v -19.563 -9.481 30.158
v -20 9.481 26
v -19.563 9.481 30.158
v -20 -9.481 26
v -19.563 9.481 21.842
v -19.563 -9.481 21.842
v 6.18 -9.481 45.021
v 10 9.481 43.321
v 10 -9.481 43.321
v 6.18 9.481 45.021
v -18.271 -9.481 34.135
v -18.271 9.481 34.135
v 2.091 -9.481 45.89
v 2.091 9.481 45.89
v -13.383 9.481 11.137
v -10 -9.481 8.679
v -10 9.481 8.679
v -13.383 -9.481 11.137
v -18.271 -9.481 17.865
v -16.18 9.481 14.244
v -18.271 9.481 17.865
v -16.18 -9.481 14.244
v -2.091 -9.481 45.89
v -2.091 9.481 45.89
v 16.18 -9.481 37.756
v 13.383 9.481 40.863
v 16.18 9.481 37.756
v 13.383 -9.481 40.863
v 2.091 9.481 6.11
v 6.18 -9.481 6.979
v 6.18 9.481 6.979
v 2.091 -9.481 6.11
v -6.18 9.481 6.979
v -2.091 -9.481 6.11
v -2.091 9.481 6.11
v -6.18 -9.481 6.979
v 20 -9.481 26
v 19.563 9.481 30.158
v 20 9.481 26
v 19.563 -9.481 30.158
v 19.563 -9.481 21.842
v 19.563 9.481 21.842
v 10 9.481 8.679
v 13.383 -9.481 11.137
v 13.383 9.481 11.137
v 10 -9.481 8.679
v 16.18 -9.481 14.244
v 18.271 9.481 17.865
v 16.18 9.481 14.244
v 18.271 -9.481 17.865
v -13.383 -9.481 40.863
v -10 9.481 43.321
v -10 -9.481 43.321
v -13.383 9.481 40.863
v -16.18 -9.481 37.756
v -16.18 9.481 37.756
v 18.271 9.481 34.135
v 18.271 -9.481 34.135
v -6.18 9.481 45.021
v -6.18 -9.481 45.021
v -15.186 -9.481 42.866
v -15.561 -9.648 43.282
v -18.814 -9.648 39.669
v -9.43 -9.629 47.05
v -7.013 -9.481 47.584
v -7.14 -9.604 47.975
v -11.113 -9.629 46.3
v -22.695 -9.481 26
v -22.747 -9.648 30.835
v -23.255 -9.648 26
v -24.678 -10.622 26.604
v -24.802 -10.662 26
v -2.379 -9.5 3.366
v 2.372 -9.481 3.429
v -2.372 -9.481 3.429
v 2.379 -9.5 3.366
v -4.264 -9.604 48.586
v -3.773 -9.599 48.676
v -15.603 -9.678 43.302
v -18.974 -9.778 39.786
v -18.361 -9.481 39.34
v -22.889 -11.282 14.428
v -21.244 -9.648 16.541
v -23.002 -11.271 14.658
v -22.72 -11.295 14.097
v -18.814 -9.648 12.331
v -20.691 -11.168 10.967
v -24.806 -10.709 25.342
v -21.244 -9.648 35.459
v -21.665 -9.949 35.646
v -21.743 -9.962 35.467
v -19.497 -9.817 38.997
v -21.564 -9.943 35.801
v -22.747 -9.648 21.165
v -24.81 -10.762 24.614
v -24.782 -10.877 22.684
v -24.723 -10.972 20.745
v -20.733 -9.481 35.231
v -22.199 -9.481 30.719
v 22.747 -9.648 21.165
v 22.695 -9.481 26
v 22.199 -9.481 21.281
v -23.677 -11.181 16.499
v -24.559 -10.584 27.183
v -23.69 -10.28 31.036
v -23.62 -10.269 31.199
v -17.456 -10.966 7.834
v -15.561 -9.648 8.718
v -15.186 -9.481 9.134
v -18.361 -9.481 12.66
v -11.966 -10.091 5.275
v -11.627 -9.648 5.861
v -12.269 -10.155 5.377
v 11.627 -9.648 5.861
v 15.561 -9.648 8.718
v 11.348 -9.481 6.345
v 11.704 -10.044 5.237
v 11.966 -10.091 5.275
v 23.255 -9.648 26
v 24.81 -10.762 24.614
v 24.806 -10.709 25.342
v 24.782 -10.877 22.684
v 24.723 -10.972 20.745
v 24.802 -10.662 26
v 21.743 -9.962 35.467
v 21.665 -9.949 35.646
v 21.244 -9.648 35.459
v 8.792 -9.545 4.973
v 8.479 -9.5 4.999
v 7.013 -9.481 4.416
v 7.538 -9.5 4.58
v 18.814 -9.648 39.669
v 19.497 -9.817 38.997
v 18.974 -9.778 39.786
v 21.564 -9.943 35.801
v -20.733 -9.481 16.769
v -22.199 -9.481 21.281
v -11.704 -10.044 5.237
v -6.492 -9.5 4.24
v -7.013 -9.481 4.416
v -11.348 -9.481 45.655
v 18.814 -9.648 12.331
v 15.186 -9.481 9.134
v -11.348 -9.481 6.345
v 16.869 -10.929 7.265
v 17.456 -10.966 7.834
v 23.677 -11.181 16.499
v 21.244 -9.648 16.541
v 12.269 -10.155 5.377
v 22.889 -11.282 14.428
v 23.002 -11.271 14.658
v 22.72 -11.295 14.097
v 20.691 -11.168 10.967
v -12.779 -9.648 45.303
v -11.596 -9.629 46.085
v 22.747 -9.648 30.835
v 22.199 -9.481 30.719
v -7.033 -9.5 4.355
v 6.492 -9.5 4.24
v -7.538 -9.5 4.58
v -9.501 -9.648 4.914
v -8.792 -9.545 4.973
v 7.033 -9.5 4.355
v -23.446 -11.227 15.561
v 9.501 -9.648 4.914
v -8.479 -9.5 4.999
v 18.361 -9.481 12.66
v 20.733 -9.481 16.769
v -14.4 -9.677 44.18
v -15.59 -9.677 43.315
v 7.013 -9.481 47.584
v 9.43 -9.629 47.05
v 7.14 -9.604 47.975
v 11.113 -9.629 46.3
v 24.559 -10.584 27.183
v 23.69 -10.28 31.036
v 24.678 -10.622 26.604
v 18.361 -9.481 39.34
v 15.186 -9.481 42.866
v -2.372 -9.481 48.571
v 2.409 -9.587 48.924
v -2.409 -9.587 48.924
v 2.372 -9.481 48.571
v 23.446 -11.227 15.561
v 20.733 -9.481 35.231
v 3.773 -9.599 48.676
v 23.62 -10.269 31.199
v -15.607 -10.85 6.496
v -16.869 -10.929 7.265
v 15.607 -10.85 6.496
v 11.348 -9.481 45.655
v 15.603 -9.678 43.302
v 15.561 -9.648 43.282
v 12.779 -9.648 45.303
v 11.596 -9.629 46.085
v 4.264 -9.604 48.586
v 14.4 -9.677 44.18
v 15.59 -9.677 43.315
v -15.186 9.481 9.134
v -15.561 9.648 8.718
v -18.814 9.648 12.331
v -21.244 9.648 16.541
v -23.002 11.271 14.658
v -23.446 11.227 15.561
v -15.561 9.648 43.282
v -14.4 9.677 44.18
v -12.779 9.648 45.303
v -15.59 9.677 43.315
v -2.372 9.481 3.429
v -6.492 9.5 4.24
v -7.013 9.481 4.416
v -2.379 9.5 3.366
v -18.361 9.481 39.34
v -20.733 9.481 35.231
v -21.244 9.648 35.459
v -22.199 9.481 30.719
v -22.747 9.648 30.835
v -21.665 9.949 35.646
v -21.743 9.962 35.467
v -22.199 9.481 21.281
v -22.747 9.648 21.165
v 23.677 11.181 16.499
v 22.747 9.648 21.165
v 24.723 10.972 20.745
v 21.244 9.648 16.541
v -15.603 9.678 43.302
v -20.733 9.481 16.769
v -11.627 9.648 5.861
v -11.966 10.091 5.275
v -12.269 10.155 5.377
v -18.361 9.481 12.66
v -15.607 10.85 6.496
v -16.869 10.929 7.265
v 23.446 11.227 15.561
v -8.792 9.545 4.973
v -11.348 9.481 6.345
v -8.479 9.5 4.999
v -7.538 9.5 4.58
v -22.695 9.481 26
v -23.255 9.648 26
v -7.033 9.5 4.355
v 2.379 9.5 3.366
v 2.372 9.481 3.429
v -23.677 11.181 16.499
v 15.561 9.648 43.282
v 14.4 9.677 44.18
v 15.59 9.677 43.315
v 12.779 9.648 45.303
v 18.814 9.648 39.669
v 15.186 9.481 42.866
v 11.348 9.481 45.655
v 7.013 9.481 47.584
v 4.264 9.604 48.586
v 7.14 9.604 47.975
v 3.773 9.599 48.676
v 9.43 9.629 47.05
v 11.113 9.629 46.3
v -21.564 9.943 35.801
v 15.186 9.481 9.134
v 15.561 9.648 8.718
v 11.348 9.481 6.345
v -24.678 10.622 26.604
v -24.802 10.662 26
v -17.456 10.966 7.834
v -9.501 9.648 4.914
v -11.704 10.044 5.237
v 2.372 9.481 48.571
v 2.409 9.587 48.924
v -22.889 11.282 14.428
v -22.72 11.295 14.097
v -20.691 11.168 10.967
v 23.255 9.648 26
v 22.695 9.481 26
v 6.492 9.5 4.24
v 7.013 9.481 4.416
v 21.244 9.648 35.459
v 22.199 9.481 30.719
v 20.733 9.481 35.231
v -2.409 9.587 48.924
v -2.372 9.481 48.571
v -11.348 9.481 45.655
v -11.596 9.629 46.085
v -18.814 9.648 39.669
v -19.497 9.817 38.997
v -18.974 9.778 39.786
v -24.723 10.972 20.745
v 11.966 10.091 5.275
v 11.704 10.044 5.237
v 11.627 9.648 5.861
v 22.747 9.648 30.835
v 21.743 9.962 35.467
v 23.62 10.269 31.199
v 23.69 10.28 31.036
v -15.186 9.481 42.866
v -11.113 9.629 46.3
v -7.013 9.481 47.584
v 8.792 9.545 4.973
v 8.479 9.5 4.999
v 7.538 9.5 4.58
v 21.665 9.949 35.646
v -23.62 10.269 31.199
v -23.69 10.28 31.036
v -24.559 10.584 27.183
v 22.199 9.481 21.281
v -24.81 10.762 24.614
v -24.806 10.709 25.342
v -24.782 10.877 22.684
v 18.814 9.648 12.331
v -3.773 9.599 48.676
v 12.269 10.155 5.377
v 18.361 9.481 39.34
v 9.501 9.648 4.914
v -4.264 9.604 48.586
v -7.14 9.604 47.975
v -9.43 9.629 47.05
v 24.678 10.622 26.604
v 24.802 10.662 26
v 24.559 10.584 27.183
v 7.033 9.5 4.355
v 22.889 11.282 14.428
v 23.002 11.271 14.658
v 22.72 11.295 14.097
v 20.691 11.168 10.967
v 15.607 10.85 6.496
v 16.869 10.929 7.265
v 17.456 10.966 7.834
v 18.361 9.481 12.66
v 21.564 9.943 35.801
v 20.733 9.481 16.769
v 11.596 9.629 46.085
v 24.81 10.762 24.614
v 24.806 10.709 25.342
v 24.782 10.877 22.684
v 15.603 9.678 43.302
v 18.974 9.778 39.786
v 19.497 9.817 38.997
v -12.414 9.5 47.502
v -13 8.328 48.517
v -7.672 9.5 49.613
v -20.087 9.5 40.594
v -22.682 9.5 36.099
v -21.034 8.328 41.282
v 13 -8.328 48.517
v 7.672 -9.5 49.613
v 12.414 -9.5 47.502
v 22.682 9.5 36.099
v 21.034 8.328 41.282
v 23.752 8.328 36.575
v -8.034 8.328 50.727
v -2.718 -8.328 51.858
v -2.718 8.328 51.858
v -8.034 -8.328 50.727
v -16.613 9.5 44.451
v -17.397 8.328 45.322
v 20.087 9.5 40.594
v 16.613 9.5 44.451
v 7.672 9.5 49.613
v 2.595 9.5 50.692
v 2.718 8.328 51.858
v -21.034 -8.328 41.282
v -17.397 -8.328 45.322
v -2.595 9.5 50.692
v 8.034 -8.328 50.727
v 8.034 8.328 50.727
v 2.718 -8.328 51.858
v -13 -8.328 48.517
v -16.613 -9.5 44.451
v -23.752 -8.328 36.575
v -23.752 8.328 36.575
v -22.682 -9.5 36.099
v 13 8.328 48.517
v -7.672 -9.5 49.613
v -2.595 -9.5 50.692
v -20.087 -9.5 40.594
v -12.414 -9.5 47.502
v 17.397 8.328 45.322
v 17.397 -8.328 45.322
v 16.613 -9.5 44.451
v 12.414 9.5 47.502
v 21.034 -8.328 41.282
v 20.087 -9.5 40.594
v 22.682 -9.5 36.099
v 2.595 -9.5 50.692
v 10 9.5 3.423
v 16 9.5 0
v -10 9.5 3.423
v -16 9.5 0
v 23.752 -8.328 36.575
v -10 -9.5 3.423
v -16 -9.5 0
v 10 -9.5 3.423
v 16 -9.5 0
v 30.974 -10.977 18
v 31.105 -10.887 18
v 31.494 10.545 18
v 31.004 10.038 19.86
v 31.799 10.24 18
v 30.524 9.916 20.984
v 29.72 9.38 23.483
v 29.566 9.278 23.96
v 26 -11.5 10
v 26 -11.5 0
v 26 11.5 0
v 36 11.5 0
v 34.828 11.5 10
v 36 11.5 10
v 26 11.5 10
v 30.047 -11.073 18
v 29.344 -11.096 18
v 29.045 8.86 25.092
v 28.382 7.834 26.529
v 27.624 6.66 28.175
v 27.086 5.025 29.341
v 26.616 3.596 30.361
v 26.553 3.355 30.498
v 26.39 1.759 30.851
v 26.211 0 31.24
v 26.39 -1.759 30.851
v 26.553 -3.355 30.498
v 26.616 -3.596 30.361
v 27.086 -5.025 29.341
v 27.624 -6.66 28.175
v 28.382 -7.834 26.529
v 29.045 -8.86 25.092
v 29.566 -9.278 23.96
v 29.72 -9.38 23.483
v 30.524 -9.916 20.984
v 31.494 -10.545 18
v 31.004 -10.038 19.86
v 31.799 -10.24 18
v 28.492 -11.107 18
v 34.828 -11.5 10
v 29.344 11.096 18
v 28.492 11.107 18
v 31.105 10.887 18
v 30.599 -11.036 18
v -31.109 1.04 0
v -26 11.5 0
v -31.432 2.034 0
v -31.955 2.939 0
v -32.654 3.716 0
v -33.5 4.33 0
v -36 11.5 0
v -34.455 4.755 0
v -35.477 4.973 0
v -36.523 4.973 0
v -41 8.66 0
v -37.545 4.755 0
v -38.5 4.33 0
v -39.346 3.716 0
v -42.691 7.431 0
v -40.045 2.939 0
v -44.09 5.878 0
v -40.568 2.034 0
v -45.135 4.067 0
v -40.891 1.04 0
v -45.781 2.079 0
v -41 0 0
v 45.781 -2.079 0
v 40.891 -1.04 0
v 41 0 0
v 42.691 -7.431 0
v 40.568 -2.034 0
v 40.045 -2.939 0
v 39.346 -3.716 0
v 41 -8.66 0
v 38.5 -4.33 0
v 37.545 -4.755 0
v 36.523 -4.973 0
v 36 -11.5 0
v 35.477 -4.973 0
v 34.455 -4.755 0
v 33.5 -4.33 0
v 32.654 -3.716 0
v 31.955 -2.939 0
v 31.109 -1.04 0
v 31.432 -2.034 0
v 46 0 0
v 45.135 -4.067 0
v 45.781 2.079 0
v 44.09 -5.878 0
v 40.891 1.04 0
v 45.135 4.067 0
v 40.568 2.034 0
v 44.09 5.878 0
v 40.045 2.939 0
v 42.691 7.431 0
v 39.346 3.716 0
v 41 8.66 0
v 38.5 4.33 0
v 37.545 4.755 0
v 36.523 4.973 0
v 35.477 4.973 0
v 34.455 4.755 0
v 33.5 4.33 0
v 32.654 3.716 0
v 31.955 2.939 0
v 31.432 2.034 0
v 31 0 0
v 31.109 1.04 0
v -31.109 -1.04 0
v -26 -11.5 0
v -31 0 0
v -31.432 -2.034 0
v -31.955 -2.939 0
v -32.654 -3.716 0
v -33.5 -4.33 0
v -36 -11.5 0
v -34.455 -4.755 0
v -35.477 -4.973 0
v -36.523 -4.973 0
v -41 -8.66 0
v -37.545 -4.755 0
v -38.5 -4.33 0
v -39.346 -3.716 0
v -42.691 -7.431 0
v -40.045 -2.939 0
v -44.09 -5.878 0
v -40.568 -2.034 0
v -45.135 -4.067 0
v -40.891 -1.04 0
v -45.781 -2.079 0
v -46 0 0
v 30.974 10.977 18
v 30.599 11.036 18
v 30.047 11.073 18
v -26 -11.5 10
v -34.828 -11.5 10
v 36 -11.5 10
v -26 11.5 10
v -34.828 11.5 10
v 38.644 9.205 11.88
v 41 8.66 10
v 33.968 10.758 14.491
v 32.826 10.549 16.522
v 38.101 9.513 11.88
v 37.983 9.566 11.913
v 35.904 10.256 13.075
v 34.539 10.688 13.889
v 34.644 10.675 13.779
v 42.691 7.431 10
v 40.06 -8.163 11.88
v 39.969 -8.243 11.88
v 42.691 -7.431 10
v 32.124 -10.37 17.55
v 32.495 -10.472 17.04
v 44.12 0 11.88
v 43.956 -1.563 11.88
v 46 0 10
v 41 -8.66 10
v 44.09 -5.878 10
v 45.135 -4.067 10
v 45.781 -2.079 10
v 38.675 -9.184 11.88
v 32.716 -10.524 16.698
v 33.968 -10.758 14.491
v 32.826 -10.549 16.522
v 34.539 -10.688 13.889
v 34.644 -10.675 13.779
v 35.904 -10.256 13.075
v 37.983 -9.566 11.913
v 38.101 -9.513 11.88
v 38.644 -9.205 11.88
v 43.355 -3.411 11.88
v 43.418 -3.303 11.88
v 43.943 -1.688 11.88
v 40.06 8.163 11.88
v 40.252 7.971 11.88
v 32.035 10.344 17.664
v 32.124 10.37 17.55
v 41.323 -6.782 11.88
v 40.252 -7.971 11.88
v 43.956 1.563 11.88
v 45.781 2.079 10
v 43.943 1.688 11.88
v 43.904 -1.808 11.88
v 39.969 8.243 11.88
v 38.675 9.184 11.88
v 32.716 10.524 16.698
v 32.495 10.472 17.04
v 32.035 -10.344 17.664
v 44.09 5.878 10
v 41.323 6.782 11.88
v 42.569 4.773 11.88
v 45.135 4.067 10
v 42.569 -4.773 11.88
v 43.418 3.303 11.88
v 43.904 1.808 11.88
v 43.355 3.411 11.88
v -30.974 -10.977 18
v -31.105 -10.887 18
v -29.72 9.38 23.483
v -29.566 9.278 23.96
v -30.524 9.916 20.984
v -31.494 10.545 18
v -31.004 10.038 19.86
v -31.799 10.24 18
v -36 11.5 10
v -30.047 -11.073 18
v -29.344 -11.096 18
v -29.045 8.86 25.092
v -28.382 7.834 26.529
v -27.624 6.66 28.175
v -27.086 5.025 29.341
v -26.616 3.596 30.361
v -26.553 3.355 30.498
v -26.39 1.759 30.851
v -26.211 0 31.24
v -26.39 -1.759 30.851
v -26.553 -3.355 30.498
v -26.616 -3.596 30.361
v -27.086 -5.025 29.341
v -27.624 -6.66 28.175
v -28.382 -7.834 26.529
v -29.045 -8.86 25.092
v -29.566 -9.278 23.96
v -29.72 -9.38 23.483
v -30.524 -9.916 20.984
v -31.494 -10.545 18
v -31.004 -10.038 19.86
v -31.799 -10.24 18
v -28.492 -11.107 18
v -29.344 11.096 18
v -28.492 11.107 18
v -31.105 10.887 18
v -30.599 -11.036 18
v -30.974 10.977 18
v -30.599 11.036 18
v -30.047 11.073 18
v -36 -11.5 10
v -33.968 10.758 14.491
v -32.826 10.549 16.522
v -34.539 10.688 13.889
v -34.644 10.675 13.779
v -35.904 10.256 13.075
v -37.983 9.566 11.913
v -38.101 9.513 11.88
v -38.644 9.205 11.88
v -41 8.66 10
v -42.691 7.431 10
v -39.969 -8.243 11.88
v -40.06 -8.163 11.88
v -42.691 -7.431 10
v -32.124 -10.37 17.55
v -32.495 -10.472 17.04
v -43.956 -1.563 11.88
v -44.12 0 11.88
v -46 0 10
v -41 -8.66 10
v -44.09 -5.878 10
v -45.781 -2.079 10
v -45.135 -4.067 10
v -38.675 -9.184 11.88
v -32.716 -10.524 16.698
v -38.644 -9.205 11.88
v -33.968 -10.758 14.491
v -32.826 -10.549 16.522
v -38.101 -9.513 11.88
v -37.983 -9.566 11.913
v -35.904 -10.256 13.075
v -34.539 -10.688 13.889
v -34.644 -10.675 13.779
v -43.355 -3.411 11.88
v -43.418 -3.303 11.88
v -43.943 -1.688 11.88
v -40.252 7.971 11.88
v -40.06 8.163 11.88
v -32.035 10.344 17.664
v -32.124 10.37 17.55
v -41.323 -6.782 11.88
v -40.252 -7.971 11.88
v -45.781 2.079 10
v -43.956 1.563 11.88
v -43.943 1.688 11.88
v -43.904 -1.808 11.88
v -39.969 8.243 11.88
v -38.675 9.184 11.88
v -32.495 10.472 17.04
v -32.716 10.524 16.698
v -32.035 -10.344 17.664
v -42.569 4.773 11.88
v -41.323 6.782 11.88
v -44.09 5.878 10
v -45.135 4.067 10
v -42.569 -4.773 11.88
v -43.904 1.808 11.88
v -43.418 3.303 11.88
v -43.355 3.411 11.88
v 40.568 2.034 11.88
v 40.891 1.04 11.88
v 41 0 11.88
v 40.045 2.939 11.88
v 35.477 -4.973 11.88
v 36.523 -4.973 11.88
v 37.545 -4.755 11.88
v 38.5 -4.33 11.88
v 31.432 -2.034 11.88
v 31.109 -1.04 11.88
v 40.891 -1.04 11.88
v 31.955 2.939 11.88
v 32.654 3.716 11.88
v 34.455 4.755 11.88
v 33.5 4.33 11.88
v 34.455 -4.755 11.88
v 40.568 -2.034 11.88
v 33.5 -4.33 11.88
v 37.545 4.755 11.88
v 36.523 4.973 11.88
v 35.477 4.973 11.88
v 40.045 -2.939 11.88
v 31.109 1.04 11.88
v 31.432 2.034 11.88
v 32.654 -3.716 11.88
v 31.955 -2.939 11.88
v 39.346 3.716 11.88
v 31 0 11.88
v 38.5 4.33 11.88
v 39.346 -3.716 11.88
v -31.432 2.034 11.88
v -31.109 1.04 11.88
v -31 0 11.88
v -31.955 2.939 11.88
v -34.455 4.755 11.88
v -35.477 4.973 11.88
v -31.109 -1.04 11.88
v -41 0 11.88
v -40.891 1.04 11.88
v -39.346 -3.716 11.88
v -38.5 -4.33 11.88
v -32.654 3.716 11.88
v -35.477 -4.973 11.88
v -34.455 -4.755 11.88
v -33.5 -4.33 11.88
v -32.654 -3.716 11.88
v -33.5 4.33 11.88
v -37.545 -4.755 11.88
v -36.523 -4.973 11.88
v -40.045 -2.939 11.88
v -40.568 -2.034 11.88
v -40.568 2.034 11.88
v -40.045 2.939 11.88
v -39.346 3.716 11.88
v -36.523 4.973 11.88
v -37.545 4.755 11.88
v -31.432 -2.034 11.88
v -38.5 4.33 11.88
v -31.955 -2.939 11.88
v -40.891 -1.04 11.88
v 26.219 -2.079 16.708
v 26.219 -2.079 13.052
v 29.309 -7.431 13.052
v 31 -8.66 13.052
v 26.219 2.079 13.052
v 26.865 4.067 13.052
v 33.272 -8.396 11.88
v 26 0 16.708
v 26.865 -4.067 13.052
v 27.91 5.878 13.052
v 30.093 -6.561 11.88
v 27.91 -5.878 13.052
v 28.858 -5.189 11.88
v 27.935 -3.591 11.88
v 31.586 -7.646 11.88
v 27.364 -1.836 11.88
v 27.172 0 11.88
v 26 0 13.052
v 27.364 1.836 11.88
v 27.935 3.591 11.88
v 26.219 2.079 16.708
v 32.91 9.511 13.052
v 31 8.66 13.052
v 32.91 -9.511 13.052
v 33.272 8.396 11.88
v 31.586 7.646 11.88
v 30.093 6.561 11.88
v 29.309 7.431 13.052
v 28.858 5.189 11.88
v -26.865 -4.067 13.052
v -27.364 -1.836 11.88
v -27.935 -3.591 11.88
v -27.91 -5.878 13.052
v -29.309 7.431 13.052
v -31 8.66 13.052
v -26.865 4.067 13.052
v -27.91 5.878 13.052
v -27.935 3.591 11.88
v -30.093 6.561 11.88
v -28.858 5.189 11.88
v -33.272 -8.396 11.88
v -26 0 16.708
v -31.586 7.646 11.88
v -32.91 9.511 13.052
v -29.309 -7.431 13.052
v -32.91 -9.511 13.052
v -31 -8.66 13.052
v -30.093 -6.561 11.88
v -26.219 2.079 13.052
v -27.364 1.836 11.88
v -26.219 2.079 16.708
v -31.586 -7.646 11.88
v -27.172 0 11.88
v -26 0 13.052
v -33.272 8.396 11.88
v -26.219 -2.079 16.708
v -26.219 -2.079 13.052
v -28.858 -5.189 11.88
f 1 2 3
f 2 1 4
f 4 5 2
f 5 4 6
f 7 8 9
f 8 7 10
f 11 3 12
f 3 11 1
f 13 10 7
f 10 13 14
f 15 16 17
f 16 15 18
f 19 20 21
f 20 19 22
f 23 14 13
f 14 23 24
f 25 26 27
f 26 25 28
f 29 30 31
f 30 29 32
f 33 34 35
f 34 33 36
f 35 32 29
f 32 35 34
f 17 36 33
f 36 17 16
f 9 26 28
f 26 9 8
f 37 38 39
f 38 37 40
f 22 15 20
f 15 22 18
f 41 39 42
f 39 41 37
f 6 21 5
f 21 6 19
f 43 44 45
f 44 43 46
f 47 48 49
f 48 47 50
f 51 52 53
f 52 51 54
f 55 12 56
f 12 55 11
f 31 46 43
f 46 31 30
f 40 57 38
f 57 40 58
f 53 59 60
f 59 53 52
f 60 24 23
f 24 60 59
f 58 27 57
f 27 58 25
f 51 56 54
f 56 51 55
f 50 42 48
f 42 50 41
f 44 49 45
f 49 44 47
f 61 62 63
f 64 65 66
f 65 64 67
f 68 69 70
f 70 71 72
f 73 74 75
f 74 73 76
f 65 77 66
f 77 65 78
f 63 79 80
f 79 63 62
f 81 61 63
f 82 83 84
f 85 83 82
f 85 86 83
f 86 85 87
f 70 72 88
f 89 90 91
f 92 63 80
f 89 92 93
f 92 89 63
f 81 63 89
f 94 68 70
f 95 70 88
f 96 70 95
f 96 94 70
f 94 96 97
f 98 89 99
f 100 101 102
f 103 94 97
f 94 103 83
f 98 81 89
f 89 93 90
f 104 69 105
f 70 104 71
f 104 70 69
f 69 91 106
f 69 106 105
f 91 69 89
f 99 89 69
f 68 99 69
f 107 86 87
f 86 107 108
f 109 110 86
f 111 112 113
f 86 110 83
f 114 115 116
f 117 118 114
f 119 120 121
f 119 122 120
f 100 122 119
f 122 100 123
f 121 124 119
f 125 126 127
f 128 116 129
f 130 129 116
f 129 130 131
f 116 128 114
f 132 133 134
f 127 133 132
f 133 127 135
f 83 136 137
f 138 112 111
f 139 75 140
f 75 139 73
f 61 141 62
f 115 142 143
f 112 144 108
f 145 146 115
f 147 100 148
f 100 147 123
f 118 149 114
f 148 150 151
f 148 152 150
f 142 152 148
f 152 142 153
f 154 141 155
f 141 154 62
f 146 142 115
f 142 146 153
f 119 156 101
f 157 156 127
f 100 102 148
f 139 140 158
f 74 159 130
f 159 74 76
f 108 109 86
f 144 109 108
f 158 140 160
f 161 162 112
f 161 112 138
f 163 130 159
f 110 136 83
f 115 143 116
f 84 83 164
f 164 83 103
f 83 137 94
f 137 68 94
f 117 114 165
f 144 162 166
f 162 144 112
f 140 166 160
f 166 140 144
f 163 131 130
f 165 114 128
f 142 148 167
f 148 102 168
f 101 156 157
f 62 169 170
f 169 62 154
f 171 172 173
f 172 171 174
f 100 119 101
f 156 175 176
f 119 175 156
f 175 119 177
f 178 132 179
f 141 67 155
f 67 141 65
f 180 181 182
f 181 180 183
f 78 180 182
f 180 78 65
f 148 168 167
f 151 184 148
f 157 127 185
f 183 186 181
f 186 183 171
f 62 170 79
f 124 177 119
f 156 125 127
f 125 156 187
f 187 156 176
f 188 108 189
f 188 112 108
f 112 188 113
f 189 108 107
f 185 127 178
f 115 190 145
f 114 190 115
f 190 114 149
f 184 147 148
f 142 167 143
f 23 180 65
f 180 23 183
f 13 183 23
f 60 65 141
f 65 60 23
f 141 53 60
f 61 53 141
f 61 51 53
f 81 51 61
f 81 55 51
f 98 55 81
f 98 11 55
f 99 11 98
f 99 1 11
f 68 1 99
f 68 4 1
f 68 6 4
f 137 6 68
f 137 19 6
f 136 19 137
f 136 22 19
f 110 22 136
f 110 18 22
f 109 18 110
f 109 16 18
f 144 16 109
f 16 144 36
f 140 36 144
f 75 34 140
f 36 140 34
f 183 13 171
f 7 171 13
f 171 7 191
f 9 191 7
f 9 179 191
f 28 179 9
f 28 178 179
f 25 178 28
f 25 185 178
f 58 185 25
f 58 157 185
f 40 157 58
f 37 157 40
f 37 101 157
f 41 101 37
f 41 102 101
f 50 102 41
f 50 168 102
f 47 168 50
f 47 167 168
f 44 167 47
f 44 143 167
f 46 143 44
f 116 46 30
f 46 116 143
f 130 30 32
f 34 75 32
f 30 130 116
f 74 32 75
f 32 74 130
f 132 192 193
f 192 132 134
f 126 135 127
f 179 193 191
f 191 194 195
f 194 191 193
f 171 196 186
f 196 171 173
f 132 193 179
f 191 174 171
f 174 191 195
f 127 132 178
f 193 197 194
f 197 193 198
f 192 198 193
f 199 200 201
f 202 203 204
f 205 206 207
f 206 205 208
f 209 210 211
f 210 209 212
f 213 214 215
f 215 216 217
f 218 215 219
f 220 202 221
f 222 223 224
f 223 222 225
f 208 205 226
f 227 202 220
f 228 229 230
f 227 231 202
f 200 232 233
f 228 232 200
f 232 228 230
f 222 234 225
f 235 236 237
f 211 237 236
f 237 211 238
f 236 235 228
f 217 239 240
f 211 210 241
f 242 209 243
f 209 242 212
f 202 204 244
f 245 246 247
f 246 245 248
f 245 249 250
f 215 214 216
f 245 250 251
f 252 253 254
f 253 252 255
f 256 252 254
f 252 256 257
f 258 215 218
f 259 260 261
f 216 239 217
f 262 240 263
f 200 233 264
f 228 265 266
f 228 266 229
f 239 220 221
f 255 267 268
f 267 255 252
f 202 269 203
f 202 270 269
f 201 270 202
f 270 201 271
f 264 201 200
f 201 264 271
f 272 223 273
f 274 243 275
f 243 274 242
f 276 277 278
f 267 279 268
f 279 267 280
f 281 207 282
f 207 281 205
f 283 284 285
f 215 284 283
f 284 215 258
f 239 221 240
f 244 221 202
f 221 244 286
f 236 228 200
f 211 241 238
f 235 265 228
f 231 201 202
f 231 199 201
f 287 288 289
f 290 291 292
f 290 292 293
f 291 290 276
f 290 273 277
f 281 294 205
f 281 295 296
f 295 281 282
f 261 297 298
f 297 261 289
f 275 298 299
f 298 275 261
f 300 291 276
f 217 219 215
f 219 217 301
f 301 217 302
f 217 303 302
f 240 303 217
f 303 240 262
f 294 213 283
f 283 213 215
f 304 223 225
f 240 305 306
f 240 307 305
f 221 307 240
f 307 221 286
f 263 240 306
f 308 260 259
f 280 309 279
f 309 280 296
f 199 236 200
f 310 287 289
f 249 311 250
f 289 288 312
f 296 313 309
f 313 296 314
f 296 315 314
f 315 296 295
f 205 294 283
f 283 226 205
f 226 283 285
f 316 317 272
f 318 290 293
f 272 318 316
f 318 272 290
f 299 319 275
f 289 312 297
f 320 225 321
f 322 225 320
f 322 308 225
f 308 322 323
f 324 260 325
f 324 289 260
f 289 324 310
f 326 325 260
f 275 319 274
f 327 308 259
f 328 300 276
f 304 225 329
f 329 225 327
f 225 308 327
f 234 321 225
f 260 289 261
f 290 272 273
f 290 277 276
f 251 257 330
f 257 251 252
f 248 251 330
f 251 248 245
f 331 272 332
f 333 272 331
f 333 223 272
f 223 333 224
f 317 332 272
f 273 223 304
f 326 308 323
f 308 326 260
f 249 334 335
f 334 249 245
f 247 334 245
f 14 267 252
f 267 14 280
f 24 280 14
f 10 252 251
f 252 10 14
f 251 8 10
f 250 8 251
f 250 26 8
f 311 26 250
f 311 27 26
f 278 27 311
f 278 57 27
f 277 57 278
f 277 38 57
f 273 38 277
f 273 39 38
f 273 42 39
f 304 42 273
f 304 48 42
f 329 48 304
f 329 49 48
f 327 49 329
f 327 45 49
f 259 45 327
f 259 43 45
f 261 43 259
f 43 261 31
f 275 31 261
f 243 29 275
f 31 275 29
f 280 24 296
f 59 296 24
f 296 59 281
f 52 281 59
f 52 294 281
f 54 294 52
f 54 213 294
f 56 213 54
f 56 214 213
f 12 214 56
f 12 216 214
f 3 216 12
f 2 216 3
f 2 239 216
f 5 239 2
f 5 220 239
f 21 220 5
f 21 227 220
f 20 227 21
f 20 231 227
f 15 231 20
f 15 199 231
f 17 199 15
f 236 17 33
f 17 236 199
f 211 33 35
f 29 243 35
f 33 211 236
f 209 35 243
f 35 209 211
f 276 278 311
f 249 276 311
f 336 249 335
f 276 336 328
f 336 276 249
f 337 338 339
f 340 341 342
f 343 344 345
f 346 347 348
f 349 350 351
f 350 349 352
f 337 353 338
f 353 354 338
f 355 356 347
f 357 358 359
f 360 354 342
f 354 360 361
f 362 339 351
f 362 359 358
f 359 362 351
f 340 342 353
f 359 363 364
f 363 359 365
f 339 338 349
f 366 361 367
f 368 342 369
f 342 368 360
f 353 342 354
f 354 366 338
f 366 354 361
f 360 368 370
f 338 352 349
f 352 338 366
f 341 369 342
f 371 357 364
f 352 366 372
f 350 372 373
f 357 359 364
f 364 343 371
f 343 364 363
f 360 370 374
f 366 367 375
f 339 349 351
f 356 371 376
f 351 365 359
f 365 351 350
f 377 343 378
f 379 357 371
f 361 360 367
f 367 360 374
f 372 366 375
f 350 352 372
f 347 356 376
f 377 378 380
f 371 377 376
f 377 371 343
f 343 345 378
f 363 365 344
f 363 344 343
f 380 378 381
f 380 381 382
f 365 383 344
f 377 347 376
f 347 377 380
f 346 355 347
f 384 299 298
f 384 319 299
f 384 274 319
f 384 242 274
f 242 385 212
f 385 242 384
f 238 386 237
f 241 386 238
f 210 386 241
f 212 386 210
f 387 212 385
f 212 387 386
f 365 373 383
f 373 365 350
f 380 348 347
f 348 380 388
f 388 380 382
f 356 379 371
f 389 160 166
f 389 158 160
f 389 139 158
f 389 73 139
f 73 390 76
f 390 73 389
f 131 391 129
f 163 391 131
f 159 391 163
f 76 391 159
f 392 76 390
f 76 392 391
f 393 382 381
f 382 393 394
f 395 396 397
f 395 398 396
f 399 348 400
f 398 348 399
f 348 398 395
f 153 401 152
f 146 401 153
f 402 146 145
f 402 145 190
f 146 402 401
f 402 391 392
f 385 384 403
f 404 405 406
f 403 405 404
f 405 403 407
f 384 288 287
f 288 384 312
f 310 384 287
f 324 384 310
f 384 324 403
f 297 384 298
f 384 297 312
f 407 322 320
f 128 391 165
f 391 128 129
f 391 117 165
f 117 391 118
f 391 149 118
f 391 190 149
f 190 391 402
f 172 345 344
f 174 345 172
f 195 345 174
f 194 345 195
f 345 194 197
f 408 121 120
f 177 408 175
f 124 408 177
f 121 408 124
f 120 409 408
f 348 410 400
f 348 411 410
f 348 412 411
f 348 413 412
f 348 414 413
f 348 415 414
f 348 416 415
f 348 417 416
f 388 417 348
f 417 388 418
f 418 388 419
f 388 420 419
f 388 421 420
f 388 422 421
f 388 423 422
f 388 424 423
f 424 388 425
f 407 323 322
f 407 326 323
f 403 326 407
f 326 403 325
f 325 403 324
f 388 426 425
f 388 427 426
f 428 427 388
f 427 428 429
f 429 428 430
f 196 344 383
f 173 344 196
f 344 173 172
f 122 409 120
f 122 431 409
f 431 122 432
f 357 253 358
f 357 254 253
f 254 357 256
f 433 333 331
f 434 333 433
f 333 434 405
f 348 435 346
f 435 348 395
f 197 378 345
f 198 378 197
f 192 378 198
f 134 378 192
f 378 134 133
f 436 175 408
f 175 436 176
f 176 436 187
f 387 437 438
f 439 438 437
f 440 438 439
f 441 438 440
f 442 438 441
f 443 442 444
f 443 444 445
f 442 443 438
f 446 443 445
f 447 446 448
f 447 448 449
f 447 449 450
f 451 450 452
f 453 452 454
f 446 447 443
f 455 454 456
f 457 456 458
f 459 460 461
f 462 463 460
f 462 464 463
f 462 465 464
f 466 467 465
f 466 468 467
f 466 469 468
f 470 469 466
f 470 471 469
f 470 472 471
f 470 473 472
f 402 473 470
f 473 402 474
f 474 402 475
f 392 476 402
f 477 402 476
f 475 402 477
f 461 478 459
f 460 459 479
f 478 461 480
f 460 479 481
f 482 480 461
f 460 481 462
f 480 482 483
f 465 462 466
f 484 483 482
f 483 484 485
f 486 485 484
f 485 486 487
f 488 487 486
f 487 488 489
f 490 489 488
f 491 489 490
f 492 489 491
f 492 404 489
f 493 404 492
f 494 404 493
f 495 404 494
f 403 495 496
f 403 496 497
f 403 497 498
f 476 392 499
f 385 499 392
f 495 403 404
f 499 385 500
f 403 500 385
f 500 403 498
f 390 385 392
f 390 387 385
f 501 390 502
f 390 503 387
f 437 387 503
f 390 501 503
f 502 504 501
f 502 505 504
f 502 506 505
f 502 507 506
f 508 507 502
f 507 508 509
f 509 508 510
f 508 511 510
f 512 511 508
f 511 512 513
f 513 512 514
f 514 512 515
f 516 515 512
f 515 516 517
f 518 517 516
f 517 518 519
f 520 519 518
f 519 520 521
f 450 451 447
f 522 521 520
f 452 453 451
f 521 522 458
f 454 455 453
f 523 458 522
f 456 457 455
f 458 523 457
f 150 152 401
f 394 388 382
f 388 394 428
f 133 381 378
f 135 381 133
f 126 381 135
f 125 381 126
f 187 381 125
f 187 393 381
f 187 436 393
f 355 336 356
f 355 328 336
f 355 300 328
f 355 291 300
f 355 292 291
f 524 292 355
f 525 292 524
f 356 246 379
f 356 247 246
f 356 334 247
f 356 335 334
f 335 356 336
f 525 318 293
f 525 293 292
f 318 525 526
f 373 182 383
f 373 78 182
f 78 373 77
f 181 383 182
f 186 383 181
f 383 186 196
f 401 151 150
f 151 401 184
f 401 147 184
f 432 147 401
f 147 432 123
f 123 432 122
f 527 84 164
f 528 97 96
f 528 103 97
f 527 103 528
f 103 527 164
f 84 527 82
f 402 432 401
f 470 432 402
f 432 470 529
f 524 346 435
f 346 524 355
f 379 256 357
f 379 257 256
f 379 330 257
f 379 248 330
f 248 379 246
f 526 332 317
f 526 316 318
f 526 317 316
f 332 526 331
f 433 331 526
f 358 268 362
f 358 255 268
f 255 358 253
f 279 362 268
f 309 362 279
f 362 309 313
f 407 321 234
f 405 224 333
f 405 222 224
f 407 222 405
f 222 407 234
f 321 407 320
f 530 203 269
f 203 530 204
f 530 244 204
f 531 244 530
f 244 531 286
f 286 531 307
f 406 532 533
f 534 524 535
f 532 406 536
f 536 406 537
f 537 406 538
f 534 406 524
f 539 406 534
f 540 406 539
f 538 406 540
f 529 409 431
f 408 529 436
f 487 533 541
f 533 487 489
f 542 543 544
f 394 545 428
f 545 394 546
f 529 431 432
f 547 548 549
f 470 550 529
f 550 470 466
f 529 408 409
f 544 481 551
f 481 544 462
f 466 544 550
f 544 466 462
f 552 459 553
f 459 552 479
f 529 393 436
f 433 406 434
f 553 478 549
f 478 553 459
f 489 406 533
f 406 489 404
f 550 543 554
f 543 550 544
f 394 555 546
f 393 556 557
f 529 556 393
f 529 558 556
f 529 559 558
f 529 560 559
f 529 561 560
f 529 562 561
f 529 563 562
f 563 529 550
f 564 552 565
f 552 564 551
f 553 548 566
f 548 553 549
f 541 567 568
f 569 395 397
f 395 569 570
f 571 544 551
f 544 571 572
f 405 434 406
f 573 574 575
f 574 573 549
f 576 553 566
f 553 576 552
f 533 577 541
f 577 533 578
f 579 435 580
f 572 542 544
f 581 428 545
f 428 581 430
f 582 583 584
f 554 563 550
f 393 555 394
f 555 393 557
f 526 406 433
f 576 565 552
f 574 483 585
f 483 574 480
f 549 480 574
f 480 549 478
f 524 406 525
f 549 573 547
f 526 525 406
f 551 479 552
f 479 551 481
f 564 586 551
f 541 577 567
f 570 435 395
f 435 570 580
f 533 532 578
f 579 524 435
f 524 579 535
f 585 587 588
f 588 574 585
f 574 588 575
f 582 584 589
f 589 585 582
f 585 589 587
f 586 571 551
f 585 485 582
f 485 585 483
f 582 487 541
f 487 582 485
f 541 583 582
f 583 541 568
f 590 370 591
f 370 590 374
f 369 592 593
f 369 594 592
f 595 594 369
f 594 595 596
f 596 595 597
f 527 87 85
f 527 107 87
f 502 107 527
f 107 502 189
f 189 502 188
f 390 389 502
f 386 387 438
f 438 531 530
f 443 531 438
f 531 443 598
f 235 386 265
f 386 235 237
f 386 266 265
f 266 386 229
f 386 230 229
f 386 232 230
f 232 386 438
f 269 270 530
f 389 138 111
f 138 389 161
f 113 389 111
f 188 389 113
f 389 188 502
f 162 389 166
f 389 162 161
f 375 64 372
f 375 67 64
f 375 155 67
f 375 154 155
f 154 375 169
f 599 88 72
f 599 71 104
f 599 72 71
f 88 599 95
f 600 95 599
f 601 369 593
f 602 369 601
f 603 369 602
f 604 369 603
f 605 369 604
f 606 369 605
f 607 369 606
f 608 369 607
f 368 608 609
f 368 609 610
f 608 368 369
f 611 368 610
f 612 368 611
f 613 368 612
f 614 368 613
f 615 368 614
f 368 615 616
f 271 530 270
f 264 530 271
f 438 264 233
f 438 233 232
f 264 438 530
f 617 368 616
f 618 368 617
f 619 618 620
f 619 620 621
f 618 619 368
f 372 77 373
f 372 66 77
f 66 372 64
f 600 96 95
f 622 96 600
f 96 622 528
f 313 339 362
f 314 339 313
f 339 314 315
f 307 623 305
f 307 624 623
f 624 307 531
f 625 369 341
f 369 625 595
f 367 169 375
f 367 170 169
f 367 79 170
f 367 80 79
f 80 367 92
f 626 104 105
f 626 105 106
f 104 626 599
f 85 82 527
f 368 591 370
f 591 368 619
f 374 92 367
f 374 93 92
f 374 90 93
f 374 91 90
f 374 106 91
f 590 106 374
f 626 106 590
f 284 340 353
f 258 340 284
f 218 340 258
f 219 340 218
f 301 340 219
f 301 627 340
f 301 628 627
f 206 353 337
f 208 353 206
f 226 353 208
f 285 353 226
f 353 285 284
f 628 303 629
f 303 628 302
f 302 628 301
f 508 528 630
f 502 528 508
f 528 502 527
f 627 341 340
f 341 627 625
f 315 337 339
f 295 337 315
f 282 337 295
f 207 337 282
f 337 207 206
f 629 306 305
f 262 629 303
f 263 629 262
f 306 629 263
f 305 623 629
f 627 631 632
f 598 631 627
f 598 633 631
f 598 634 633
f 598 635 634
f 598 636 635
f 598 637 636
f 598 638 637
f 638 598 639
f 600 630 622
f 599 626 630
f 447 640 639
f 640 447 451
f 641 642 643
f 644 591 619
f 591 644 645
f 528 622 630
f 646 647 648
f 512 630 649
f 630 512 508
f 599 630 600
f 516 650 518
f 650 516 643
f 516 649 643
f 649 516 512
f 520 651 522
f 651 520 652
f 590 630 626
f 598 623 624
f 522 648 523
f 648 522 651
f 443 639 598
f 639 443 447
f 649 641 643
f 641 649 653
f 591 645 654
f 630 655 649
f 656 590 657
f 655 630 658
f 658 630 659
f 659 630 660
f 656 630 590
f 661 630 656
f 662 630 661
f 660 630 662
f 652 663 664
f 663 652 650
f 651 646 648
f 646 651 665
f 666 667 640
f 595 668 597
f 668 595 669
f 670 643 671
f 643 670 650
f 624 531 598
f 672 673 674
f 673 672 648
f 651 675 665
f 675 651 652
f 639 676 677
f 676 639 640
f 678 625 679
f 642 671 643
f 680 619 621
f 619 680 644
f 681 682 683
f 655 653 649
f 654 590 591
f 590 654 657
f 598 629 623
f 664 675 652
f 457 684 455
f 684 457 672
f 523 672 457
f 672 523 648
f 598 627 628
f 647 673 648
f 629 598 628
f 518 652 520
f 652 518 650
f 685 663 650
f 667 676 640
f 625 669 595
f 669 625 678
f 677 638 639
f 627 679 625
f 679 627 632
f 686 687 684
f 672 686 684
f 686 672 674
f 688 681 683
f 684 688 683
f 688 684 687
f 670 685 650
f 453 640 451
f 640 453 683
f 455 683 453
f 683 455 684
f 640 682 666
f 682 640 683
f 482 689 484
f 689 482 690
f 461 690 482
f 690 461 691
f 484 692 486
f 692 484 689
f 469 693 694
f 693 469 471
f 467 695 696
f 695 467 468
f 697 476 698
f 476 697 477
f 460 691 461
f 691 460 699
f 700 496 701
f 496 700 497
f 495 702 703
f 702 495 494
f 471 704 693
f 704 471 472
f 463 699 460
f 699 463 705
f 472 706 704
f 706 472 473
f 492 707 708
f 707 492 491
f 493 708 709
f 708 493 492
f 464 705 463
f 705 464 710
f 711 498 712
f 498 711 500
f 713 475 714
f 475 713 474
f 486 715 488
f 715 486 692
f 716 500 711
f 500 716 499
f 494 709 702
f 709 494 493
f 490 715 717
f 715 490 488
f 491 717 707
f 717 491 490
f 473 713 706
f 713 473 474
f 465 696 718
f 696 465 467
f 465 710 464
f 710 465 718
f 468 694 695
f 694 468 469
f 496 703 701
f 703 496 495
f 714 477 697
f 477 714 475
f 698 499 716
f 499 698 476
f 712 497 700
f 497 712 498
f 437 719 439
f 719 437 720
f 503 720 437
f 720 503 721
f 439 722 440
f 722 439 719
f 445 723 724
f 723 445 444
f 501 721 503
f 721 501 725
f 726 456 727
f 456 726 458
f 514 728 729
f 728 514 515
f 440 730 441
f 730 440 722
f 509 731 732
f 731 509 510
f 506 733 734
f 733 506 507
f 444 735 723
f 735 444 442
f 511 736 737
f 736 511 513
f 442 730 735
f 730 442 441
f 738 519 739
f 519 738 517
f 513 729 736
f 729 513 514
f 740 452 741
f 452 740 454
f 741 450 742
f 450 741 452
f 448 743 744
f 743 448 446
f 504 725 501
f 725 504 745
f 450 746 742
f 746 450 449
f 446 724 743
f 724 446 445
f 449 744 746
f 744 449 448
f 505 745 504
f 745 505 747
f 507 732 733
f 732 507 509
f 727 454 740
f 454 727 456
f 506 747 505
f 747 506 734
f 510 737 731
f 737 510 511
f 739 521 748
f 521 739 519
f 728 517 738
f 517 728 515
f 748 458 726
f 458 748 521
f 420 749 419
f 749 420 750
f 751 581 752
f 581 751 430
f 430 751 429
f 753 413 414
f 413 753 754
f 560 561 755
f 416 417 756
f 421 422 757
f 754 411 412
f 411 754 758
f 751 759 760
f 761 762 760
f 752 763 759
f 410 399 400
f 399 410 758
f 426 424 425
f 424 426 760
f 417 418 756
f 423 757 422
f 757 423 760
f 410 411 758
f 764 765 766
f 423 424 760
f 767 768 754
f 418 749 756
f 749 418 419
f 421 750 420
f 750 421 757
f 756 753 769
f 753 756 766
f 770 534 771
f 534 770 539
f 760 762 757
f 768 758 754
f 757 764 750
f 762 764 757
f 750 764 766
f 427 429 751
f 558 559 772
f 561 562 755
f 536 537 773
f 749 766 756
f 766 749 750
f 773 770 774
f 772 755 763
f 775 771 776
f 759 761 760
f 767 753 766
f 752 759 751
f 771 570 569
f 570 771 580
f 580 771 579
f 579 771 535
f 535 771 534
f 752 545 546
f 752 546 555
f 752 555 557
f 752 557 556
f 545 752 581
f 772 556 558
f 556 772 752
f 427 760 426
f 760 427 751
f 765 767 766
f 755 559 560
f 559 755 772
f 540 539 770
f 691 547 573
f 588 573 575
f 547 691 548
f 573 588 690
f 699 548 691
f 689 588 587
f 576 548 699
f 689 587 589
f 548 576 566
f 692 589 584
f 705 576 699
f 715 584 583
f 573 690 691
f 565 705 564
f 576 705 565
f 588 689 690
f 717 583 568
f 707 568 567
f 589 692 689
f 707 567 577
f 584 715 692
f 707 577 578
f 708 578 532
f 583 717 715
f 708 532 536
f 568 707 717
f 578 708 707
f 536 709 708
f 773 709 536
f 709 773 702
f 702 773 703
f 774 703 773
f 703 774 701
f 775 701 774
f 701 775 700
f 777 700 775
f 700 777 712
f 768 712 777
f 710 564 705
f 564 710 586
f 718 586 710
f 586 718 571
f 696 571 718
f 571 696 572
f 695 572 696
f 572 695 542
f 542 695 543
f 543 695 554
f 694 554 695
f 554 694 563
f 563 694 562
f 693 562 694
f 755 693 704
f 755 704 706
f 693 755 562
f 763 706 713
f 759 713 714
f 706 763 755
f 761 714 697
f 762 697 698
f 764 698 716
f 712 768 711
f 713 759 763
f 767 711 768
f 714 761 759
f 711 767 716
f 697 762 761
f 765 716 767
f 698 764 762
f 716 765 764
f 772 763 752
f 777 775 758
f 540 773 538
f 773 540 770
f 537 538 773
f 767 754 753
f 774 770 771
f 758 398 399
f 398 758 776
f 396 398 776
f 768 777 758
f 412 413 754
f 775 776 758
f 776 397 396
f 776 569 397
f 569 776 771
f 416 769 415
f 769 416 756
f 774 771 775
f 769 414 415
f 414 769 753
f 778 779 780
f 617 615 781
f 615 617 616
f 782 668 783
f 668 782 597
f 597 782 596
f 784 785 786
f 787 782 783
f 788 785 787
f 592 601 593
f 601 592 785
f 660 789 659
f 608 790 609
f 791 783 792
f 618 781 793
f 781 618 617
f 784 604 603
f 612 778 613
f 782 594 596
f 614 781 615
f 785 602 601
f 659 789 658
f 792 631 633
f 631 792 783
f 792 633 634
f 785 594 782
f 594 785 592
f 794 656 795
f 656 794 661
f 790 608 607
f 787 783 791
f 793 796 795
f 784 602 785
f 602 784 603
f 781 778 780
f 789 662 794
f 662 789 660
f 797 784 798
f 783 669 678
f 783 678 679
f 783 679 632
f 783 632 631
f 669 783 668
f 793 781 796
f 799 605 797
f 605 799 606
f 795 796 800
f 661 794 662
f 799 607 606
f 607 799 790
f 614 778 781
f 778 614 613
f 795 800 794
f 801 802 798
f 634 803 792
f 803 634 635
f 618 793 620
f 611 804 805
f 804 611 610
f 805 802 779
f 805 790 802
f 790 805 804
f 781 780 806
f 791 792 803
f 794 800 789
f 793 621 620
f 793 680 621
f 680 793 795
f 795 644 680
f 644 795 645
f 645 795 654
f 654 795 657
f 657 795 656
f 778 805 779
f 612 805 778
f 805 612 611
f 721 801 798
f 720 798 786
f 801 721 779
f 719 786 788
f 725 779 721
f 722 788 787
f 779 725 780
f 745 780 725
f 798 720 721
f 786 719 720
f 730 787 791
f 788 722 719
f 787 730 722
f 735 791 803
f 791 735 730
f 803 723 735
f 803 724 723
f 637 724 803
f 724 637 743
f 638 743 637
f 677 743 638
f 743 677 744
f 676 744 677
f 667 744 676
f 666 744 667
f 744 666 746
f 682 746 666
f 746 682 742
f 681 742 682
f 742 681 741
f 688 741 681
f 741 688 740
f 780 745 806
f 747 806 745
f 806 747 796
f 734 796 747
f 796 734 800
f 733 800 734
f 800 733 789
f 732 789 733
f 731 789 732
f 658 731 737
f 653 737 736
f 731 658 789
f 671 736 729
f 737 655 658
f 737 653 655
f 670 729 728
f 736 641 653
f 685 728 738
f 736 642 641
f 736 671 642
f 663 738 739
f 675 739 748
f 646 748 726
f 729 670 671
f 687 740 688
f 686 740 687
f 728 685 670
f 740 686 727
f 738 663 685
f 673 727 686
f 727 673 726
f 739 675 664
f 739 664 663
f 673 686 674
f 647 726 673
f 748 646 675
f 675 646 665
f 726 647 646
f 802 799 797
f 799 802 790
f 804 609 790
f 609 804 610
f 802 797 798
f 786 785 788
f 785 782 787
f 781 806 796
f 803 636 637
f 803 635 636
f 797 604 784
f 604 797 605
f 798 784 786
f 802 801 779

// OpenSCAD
Bearing_Radius=20;
Bearing_Width=19;
boltholeradius=5;
boltheadradius=10;

boltholeCC=72;
 footheight=12;
footwidth=23;
material=6;
chamfer=2;
$fn=30;

//Bearing_Radius=rnd(7,25);
//Bearing_Width=rnd(10,30);
//boltholeradius=rnd(Bearing_Width/6,Bearing_Width/4 );
//boltheadradius=rnd(boltholeradius*1.3,boltholeradius*2);
//
//boltholeCC=rnd(Bearing_Radius *2 ,Bearing_Radius*4);
// footheight=rnd(Bearing_Radius/4 ,Bearing_Radius/2 );
//footwidth=rnd(1,Bearing_Radius/2 );
//material=rnd(3,Bearing_Radius/4 );
//chamfer=rnd(1,2);
//$fn=30;




 fw=max(boltheadradius*2,footwidth);

 difference(){
translate([0,0,Bearing_Radius+material]){rotate([90,0,0])roundcyl(Bearing_Radius+material ,Bearing_Width  ,center=true);}
bearinghole();
}
difference(){
union(){
 translate([0,0,Bearing_Radius+material]){rotate([90,0,0])roundcyl(Bearing_Radius+material*0.5,Bearing_Width  ,center=true);}
 linear_extrude(material*2 ) {
 square([Bearing_Radius*2+material*2,min(Bearing_Width,fw)],center=true);}
union(){
 smallfoothouse();
hull(){
intersection(){smallfoothouse();
 hull(){
scale([1,5,1.5])foot();}
}
foot();}
}
mirror([1,0,0])union(){
 smallfoothouse();
hull(){
intersection(){smallfoothouse();
 hull(){
scale([1,5,1.5])foot();}
}
foot();}
}}
 
holes1();}

module holes1(){
//holes
bearinghole();

//bolt hole
translate([boltholeCC*0.5,0,0])cylinder(footheight*2,boltholeradius,boltholeradius,center=true);
translate([-boltholeCC*0.5,0,0])cylinder(footheight*2,boltholeradius,boltholeradius,center=true);

 hull(){
 translate([boltholeCC*0.5,0,footheight*0.99])
roundcyl(boltheadradius ,chamfer*3 ,boltheadradius  );

 translate([boltholeCC*0.5+boltheadradius*3,0,footheight*0.99+Bearing_Radius +material*2])
roundcyl(boltheadradius*2 ,Bearing_Radius*2 ,boltheadradius*4 );

translate([boltholeCC+fw*0.5 ,0,footheight*0.99])
roundcyl(boltheadradius*2,Bearing_Radius ,boltheadradius*4 );
}
 mirror([1,0,0])hull(){
 translate([boltholeCC*0.5,0,footheight*0.99])
roundcyl(boltheadradius ,chamfer*3 ,boltheadradius  );

 translate([boltholeCC*0.5+boltheadradius*3,0,footheight*0.99+Bearing_Radius +material*2])
roundcyl(boltheadradius*2 ,Bearing_Radius*2 ,boltheadradius*4 );

translate([boltholeCC+fw*0.5 ,0,footheight*0.99])
roundcyl(boltheadradius*2,Bearing_Radius ,boltheadradius*4 );
}

}
module bearinghole(){
translate([0,0,Bearing_Radius+material])rotate([90,0,0])roundcyl(Bearing_Radius,(Bearing_Width+chamfer*2)  ,center=true);
translate([0,-Bearing_Width*0.499,Bearing_Radius+material])rotate([90,0,0])roundcyl(Bearing_Radius+material*0.5,Bearing_Width ,Bearing_Radius*2+material*2 );
mirror([0,1,0])translate([0,-Bearing_Width*0.499,Bearing_Radius+material])rotate([90,0,0])roundcyl(Bearing_Radius+material*0.5,Bearing_Width ,Bearing_Radius*2+material*2);
}


module roundcyl(r,h,r2=0,center=false){
if(center==true)
rotate_extrude(convex=10){
 offset(delta=+chamfer,chamfer=true) offset(delta=-chamfer,chamfer=true)translate([0,-h*0.5]) 
polygon([[0,0],[r,0],[r2==0?r:r2,h],[0,h]]);
translate([0,-h*0.5])square([r*0.5,h]);

}
else
rotate_extrude(convex=10){
 offset(delta=+chamfer,chamfer=true) offset(delta=-chamfer,chamfer=true)translate([0,0])
polygon([[0,0],[r,0],[r2==0?r:r2,h],[0,h]]);
translate([0,0])square([r*0.5,h]);

}
}

module foot(){
intersection(){translate([Bearing_Radius+material,-fw*0.5,0])cube([(boltheadradius+boltholeCC)*0.5,fw,footheight]);
 hull(){
linear_extrude(footheight
//-(fw-Bearing_Width)/2 
){
 translate([boltholeCC*0.5,0,0])circle(boltheadradius-chamfer);
 square([boltholeCC  ,fw-chamfer*2],center=true);
 }

linear_extrude(footheight-chamfer ) {
 translate([boltholeCC*0.5,0,0])circle(boltheadradius );
square([boltholeCC  ,fw],center=true);

//translate([0,0,Bearing_Radius+material])rotate([90,0,0])roundcyl(Bearing_Radius +material,Bearing_Width ,center=true);
}}}}
module smallfoot(){
intersection(){translate([Bearing_Radius+material,-fw*0.5,0])cube([(boltheadradius+boltholeCC)*0.5,fw,footheight]);
hull(){
linear_extrude(footheight
//-(fw-Bearing_Width)/2 
)
offset(delta=-chamfer,chamfer=true) 
offset(delta=+chamfer,chamfer=true)
 offset(delta=-chamfer,chamfer=true)
square([boltholeCC ,fw],center=true);

linear_extrude(footheight-chamfer )  offset(delta=+chamfer,chamfer=true) offset(delta=-chamfer,chamfer=true)square([boltholeCC ,fw],center=true);
//translate([0,0,Bearing_Radius+material])rotate([90,0,0])roundcyl(Bearing_Radius +material,Bearing_Width ,center=true);
}}}
module smallfoothouse(){
hull(){
smallfoot();

//linear_extrude(footheight)
////offset((fw-Bearing_Width)/2)
//offset(delta=(fw-Bearing_Width)/2,chamfer=true)square([boltholeCC,Bearing_Width],center=true);
 
house();


}};
module house(){
intersection(){
 union(){translate([-material,-fw*0.5,Bearing_Radius]){
cube([(boltheadradius*2+boltholeCC)*0.5,fw,(Bearing_Radius+material)*2]);}
translate([Bearing_Radius*0.5,-fw*0.5,0]){
cube([(boltheadradius+boltholeCC)*0.5,fw,(Bearing_Radius+material)*2]);}
}
translate([0,0,Bearing_Radius+material])rotate([90,0,0])roundcyl(Bearing_Radius+material,Bearing_Width ,center=true);}
 linear_extrude(material  ) {
 translate([Bearing_Radius+material,0,0])square([Bearing_Radius ,Bearing_Width],center=true);}
}


function rnd(a = 1, b = 0, s = []) = 
  s == [] ? 
   (rands(min(a, b), max(   a, b), 1)[0]) 
  : 
   (rands(min(a, b), max(a, b), 1, s)[0])
  ; 
